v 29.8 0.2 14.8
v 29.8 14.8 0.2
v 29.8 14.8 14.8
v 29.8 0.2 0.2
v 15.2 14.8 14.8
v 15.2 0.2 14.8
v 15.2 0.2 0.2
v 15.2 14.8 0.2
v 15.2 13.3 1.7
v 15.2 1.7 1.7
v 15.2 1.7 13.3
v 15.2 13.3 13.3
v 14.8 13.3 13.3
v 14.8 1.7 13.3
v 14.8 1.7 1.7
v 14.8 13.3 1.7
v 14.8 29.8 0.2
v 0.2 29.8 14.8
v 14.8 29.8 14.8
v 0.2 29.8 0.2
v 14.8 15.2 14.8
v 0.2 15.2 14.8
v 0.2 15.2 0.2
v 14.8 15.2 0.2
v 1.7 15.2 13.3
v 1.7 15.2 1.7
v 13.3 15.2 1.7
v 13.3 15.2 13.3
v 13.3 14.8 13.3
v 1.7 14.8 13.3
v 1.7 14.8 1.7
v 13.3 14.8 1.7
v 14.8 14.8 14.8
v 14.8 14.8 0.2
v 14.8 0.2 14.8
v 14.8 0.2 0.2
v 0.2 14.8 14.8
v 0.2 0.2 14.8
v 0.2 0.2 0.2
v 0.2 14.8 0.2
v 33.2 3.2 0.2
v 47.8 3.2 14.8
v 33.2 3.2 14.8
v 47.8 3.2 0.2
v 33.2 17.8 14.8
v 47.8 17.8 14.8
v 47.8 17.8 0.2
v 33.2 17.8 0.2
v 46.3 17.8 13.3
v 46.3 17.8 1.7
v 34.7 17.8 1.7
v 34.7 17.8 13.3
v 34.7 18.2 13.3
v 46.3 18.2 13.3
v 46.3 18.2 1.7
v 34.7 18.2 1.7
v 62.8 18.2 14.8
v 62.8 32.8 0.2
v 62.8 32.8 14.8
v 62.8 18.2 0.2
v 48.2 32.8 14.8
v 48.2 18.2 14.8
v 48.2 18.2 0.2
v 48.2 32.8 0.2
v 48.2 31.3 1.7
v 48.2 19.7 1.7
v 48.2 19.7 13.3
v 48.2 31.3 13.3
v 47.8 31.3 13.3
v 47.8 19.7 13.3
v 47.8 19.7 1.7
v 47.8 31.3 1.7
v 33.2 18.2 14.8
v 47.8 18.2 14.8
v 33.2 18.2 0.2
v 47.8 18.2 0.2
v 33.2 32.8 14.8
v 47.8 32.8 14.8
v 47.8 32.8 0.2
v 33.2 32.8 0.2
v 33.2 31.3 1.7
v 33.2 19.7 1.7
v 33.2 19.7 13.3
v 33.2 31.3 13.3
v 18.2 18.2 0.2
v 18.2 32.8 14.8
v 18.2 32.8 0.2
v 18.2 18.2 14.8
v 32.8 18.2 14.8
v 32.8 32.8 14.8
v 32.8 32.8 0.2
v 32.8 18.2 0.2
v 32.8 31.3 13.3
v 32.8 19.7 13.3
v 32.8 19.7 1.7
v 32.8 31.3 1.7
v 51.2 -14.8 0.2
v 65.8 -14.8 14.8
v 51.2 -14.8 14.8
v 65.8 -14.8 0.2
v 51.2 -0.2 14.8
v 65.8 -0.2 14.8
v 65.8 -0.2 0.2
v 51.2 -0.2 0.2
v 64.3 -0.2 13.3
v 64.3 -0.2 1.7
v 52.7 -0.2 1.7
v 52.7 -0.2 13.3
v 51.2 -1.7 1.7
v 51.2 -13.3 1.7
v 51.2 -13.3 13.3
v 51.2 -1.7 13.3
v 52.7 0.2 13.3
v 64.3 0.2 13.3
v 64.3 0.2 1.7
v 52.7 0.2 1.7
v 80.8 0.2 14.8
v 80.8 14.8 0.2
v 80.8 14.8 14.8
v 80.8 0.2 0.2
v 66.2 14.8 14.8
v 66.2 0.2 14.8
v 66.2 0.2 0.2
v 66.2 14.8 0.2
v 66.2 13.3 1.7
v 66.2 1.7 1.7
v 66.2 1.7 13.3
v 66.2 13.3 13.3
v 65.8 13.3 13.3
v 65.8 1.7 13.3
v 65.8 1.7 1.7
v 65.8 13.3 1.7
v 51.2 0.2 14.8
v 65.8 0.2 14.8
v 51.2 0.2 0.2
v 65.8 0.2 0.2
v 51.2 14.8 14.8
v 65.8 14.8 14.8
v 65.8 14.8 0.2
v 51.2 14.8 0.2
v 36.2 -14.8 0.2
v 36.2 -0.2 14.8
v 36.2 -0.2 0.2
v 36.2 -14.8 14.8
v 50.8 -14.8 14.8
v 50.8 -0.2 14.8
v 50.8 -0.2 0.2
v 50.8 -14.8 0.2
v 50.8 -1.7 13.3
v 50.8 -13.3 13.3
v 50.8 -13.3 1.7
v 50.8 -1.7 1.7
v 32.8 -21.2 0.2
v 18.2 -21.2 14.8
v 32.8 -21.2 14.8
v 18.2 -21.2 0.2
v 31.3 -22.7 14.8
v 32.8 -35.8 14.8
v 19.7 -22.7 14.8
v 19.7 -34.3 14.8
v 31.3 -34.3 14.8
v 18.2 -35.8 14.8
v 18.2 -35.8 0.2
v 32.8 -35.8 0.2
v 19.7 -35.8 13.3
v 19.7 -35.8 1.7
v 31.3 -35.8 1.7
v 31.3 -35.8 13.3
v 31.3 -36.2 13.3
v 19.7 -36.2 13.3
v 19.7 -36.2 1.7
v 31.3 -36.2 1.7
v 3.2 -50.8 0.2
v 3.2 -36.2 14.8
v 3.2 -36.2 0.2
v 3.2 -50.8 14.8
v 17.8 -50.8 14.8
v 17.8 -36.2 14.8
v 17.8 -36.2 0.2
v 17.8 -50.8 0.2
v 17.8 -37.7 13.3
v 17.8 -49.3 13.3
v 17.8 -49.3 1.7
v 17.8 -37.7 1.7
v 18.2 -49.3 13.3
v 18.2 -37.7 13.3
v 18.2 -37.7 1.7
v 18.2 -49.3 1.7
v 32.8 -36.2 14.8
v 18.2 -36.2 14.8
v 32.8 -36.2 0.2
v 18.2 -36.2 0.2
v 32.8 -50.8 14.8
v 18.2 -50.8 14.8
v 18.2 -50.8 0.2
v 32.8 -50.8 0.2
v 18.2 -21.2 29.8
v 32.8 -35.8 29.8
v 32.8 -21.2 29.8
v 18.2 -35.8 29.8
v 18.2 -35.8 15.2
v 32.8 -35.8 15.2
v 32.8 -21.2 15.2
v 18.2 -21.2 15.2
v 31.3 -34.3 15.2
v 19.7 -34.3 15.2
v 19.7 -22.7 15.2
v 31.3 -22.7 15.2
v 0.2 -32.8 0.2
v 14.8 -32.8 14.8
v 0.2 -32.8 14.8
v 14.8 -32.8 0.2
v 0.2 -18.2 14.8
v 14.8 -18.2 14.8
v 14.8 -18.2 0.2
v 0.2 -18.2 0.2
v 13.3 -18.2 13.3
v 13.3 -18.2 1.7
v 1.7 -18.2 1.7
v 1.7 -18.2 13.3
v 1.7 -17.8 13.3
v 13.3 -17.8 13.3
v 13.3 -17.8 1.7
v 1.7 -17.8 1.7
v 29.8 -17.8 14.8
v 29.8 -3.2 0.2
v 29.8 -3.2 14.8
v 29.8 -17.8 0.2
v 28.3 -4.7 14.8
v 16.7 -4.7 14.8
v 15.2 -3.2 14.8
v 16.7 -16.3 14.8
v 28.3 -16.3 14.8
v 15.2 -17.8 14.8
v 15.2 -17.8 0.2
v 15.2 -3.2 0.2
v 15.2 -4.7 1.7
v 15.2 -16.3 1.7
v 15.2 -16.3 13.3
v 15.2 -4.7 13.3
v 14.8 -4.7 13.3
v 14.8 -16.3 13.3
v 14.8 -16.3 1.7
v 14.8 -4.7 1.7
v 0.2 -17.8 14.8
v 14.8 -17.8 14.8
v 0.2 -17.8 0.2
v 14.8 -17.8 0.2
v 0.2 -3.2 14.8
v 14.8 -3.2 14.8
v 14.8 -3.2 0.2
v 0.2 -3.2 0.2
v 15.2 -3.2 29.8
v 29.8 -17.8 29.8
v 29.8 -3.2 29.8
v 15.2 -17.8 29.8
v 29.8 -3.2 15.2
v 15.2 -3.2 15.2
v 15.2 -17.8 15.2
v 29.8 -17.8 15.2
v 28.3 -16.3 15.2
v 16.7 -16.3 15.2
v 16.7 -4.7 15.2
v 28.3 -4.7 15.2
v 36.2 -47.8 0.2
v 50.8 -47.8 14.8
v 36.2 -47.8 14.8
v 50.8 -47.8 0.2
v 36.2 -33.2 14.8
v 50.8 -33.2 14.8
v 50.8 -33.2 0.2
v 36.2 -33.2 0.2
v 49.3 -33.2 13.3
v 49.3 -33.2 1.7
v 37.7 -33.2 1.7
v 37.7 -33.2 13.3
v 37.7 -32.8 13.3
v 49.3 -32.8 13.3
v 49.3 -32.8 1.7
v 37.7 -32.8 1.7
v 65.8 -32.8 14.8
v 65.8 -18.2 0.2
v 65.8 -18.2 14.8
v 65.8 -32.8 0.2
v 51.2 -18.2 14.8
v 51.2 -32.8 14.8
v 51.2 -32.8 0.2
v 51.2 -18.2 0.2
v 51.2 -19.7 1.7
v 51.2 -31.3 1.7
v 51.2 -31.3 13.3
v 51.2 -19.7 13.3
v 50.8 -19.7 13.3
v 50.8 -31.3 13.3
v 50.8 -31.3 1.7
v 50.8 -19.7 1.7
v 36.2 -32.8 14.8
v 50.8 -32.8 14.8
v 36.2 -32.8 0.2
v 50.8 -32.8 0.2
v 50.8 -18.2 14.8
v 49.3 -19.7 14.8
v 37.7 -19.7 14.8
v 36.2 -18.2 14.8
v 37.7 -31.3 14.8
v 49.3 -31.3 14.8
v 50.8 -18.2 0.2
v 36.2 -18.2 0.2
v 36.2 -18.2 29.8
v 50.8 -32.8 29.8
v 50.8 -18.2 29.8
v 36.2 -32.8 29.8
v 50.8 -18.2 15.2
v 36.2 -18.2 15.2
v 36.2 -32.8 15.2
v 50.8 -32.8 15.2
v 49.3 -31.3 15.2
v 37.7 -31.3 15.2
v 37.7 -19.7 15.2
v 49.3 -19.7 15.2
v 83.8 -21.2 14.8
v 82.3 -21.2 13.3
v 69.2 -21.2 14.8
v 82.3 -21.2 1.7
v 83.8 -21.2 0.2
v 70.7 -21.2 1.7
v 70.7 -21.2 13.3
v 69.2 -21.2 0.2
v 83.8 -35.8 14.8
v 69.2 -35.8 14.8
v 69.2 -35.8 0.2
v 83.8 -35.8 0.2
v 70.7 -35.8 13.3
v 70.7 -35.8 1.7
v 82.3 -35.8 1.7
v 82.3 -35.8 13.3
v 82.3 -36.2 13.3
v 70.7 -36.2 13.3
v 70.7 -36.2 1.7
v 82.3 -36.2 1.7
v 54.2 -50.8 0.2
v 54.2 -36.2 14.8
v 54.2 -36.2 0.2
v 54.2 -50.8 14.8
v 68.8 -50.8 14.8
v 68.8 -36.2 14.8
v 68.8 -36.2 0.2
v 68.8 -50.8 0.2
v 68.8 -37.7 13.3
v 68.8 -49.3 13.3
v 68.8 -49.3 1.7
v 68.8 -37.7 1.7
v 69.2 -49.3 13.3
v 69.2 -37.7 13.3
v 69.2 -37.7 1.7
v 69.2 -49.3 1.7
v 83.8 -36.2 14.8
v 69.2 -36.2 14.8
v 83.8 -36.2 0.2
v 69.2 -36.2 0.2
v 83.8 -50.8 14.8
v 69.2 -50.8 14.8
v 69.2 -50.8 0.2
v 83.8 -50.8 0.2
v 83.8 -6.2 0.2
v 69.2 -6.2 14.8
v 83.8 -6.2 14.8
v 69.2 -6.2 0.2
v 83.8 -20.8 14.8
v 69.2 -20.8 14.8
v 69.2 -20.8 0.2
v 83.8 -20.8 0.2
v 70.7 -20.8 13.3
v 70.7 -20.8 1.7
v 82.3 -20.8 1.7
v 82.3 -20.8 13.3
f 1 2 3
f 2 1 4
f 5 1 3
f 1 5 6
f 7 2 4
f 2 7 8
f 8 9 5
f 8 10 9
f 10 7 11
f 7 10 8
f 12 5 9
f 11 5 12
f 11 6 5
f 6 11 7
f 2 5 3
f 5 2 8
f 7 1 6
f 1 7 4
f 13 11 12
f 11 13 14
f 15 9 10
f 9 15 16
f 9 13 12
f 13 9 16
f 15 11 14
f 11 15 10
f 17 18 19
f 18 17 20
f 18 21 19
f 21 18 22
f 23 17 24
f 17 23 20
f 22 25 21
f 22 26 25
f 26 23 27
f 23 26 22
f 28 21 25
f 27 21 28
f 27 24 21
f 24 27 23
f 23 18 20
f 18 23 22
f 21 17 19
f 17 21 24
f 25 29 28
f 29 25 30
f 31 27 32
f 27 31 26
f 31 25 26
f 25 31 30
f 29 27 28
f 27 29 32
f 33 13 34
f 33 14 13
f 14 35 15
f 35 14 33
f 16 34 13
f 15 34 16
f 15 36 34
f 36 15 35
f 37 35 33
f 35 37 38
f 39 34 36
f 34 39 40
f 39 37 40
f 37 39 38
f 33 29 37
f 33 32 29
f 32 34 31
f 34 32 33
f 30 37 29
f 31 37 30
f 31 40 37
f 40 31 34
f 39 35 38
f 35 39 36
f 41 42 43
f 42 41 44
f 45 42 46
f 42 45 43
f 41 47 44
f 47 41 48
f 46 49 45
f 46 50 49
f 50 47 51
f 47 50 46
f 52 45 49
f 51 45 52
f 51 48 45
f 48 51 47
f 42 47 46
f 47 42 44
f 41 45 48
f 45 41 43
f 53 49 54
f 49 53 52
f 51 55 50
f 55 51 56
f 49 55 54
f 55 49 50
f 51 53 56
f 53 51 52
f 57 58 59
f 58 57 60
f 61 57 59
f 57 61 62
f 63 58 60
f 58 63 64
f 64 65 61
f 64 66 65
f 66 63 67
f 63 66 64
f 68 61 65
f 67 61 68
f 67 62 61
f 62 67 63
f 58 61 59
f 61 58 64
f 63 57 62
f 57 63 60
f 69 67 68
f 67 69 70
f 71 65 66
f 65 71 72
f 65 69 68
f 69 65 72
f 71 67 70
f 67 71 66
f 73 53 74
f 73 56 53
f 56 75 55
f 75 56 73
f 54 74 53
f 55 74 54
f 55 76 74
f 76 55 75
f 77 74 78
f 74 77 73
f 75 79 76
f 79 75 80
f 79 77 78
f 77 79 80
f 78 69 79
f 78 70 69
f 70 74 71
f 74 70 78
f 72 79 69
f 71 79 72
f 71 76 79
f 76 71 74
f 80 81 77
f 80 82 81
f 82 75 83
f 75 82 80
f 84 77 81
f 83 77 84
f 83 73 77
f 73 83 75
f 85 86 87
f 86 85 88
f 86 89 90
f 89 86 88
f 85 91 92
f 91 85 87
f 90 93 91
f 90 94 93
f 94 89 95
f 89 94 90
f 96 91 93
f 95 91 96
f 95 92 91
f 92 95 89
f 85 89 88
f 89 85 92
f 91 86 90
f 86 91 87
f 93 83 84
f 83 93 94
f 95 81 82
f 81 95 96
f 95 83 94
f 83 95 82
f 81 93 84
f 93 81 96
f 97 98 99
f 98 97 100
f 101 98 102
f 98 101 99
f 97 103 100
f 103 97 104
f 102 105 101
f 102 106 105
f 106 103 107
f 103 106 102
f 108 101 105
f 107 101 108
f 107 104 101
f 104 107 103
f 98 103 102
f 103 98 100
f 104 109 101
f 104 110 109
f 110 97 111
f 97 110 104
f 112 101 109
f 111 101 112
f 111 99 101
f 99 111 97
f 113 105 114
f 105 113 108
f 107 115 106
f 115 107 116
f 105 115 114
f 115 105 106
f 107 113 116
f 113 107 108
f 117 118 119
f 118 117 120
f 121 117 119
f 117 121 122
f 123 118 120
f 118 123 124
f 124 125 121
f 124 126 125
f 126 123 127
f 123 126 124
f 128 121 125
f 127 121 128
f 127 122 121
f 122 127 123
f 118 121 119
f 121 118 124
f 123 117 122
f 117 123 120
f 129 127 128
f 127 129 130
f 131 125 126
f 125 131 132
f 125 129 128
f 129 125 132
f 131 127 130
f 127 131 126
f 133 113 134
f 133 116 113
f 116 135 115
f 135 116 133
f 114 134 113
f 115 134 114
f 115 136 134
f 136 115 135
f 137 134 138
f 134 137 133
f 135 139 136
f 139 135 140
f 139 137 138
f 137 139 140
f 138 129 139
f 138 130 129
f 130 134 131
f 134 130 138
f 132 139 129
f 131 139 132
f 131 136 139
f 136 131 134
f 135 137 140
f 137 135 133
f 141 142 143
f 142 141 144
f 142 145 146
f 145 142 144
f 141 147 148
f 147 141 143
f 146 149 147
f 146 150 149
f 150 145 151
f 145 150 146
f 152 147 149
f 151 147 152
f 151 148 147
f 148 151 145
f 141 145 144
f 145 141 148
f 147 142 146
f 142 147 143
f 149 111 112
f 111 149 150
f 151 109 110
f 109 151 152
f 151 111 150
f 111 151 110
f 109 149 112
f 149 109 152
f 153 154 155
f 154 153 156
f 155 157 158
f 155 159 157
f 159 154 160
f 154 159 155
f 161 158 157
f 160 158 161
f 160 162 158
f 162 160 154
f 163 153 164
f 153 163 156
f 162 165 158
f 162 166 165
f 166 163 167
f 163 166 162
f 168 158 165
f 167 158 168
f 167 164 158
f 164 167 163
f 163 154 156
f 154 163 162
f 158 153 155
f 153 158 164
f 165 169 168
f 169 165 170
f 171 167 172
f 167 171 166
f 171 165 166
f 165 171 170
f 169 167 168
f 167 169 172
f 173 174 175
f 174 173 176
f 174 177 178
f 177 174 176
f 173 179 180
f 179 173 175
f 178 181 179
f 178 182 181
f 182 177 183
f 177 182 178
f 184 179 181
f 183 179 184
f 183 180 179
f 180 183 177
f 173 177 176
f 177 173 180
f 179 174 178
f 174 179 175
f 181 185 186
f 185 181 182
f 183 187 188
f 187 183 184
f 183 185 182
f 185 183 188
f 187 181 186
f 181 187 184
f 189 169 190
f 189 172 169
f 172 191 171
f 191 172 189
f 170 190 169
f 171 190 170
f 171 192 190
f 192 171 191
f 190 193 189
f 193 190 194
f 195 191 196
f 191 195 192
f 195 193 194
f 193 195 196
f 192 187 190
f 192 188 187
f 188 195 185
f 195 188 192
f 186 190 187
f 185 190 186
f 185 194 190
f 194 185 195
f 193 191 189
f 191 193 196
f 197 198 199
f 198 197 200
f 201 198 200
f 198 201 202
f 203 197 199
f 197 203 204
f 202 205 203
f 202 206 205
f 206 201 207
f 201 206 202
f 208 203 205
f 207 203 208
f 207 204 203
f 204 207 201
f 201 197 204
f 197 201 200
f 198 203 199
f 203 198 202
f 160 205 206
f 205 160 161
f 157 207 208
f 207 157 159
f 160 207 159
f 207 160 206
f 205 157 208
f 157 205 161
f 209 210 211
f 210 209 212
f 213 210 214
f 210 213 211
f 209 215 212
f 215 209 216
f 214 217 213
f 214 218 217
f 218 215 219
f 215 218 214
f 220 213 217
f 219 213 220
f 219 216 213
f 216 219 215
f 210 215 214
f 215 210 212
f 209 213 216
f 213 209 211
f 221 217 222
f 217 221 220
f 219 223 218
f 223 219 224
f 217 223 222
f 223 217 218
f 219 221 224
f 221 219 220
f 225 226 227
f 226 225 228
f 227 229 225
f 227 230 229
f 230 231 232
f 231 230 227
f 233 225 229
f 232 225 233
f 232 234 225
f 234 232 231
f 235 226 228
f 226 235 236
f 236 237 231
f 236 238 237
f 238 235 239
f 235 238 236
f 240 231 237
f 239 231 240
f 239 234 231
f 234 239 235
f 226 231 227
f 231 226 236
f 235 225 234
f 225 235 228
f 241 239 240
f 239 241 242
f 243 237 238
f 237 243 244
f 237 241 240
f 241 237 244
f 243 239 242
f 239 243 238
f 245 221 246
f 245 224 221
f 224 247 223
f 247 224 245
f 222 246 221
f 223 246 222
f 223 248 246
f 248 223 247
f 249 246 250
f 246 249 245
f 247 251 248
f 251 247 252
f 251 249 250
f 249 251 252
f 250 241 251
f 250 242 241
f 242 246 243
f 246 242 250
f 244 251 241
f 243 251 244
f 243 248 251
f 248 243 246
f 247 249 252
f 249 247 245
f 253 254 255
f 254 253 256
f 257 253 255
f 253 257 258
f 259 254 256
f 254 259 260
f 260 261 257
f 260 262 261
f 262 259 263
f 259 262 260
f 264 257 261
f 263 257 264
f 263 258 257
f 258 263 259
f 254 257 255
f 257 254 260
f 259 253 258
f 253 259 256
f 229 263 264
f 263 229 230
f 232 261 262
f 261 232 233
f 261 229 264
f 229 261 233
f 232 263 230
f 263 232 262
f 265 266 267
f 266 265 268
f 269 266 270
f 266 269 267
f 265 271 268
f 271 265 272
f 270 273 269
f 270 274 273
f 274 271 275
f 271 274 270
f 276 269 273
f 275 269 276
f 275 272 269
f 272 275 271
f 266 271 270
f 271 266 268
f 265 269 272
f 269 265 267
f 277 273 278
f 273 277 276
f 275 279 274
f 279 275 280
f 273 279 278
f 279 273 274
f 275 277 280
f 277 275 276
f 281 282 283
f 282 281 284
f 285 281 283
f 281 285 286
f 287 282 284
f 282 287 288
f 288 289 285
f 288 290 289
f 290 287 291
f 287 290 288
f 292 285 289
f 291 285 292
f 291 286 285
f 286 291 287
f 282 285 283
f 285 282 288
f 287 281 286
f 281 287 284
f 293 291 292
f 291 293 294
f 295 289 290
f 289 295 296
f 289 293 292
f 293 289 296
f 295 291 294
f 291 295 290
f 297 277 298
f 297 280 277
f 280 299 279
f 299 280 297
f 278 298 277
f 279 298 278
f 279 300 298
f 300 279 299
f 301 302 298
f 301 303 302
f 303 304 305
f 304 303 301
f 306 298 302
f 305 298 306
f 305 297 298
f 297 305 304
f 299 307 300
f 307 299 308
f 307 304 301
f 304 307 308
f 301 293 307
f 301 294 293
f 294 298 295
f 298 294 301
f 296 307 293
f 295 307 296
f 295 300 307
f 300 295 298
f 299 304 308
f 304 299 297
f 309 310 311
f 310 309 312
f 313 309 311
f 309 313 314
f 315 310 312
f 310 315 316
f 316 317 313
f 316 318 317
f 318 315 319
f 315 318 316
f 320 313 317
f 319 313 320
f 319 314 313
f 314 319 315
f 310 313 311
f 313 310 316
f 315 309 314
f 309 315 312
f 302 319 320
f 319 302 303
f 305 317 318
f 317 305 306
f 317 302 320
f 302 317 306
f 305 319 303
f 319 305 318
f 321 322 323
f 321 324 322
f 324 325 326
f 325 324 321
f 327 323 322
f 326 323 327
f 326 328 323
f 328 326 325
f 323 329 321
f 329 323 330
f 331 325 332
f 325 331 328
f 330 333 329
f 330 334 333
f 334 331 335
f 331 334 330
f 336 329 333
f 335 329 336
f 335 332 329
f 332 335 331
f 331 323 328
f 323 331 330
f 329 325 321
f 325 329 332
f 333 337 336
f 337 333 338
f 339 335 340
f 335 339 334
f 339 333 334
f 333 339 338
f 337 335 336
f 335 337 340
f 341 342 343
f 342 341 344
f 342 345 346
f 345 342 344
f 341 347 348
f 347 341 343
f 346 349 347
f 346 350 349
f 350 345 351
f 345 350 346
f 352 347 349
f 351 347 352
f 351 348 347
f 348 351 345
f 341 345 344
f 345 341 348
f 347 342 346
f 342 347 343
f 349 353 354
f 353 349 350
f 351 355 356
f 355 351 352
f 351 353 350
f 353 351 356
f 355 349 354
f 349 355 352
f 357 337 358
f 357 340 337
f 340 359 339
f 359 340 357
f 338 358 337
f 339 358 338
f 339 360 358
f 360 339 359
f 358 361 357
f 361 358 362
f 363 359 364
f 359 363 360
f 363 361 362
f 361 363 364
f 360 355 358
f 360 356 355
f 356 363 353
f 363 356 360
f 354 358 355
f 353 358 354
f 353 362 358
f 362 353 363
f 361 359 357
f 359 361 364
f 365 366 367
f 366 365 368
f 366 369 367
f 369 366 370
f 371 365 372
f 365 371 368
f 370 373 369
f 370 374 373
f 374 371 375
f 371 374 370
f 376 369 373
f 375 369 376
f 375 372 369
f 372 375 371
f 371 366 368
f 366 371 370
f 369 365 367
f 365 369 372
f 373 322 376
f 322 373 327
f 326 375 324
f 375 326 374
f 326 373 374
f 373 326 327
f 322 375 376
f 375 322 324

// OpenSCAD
/* soma puzzle */

// base component cubes size
size=15;

// size of gap lines between cubes
gap= 0.4;

// depth of gaps
gd = 1.5;

// space between main parts for printing
sp = 3;

module part0() { /* base cube */
	translate([gap / 2, gap / 2, gap / 2])
		cube(size - gap);
}

module part05() { /* cube with a connector on one side */
	part0();
	translate([-gap * 0.5005, gap / 2 + gd, gap / 2 + gd])
		cube([gap * 1.001, size - gap - 2 * gd, size - gap - 2 * gd]);
}

module part1() { /* basic 3 cube part as base for all parts */
	part0();
	translate([size, 0, 0])
		part05();
	translate([size, size, 0])
		rotate([0, 0, 90])
			part05();
}

	/* part r */
	part1();

	/* part y */
	translate([2 * size + sp, 2 * size + sp, 0])
	rotate([0, 0, -90])
	{
		part1();
		rotate([0, 0, -90])
			part05();
	}

	/* part Z */
	translate([3 * size + 2 * sp, size, 0])
	rotate([0, 0, -90])
	{
		part1();
		translate([size, 0, 0])
			rotate([0, 0, -90])
				part05();
	}

	/* part left */
	translate([2 * size + sp, -(3 * size +2 * sp), 0])
	rotate([0, 0, 90])
	{
		part1();
		rotate([0, -90, 0])
			translate([size, 0, -2 * size])
				part05();
	}

	/* part right */
	translate([0, -sp, 0])
	rotate([0, 0, -90])
	{
		part1();
		rotate([0, -90, 0])
			translate([size, size, -size])
				part05();
	}

	/* part Y */
	translate([2 * size + 2 * sp, -(size + sp), 0])
	rotate([0, 0, -90])
	{
		part1();
		rotate([0, -90, 0])
			translate([size, 0, -size])
				part05();
	}

	/* part L */
	translate([5 * size + 3 * sp, -(3 * size + 2 * sp), 0])
	rotate([0, 0, 90])
	{
		part1();
		translate([2 * size, 0, 0])
			part05();
	}

/* eof */
